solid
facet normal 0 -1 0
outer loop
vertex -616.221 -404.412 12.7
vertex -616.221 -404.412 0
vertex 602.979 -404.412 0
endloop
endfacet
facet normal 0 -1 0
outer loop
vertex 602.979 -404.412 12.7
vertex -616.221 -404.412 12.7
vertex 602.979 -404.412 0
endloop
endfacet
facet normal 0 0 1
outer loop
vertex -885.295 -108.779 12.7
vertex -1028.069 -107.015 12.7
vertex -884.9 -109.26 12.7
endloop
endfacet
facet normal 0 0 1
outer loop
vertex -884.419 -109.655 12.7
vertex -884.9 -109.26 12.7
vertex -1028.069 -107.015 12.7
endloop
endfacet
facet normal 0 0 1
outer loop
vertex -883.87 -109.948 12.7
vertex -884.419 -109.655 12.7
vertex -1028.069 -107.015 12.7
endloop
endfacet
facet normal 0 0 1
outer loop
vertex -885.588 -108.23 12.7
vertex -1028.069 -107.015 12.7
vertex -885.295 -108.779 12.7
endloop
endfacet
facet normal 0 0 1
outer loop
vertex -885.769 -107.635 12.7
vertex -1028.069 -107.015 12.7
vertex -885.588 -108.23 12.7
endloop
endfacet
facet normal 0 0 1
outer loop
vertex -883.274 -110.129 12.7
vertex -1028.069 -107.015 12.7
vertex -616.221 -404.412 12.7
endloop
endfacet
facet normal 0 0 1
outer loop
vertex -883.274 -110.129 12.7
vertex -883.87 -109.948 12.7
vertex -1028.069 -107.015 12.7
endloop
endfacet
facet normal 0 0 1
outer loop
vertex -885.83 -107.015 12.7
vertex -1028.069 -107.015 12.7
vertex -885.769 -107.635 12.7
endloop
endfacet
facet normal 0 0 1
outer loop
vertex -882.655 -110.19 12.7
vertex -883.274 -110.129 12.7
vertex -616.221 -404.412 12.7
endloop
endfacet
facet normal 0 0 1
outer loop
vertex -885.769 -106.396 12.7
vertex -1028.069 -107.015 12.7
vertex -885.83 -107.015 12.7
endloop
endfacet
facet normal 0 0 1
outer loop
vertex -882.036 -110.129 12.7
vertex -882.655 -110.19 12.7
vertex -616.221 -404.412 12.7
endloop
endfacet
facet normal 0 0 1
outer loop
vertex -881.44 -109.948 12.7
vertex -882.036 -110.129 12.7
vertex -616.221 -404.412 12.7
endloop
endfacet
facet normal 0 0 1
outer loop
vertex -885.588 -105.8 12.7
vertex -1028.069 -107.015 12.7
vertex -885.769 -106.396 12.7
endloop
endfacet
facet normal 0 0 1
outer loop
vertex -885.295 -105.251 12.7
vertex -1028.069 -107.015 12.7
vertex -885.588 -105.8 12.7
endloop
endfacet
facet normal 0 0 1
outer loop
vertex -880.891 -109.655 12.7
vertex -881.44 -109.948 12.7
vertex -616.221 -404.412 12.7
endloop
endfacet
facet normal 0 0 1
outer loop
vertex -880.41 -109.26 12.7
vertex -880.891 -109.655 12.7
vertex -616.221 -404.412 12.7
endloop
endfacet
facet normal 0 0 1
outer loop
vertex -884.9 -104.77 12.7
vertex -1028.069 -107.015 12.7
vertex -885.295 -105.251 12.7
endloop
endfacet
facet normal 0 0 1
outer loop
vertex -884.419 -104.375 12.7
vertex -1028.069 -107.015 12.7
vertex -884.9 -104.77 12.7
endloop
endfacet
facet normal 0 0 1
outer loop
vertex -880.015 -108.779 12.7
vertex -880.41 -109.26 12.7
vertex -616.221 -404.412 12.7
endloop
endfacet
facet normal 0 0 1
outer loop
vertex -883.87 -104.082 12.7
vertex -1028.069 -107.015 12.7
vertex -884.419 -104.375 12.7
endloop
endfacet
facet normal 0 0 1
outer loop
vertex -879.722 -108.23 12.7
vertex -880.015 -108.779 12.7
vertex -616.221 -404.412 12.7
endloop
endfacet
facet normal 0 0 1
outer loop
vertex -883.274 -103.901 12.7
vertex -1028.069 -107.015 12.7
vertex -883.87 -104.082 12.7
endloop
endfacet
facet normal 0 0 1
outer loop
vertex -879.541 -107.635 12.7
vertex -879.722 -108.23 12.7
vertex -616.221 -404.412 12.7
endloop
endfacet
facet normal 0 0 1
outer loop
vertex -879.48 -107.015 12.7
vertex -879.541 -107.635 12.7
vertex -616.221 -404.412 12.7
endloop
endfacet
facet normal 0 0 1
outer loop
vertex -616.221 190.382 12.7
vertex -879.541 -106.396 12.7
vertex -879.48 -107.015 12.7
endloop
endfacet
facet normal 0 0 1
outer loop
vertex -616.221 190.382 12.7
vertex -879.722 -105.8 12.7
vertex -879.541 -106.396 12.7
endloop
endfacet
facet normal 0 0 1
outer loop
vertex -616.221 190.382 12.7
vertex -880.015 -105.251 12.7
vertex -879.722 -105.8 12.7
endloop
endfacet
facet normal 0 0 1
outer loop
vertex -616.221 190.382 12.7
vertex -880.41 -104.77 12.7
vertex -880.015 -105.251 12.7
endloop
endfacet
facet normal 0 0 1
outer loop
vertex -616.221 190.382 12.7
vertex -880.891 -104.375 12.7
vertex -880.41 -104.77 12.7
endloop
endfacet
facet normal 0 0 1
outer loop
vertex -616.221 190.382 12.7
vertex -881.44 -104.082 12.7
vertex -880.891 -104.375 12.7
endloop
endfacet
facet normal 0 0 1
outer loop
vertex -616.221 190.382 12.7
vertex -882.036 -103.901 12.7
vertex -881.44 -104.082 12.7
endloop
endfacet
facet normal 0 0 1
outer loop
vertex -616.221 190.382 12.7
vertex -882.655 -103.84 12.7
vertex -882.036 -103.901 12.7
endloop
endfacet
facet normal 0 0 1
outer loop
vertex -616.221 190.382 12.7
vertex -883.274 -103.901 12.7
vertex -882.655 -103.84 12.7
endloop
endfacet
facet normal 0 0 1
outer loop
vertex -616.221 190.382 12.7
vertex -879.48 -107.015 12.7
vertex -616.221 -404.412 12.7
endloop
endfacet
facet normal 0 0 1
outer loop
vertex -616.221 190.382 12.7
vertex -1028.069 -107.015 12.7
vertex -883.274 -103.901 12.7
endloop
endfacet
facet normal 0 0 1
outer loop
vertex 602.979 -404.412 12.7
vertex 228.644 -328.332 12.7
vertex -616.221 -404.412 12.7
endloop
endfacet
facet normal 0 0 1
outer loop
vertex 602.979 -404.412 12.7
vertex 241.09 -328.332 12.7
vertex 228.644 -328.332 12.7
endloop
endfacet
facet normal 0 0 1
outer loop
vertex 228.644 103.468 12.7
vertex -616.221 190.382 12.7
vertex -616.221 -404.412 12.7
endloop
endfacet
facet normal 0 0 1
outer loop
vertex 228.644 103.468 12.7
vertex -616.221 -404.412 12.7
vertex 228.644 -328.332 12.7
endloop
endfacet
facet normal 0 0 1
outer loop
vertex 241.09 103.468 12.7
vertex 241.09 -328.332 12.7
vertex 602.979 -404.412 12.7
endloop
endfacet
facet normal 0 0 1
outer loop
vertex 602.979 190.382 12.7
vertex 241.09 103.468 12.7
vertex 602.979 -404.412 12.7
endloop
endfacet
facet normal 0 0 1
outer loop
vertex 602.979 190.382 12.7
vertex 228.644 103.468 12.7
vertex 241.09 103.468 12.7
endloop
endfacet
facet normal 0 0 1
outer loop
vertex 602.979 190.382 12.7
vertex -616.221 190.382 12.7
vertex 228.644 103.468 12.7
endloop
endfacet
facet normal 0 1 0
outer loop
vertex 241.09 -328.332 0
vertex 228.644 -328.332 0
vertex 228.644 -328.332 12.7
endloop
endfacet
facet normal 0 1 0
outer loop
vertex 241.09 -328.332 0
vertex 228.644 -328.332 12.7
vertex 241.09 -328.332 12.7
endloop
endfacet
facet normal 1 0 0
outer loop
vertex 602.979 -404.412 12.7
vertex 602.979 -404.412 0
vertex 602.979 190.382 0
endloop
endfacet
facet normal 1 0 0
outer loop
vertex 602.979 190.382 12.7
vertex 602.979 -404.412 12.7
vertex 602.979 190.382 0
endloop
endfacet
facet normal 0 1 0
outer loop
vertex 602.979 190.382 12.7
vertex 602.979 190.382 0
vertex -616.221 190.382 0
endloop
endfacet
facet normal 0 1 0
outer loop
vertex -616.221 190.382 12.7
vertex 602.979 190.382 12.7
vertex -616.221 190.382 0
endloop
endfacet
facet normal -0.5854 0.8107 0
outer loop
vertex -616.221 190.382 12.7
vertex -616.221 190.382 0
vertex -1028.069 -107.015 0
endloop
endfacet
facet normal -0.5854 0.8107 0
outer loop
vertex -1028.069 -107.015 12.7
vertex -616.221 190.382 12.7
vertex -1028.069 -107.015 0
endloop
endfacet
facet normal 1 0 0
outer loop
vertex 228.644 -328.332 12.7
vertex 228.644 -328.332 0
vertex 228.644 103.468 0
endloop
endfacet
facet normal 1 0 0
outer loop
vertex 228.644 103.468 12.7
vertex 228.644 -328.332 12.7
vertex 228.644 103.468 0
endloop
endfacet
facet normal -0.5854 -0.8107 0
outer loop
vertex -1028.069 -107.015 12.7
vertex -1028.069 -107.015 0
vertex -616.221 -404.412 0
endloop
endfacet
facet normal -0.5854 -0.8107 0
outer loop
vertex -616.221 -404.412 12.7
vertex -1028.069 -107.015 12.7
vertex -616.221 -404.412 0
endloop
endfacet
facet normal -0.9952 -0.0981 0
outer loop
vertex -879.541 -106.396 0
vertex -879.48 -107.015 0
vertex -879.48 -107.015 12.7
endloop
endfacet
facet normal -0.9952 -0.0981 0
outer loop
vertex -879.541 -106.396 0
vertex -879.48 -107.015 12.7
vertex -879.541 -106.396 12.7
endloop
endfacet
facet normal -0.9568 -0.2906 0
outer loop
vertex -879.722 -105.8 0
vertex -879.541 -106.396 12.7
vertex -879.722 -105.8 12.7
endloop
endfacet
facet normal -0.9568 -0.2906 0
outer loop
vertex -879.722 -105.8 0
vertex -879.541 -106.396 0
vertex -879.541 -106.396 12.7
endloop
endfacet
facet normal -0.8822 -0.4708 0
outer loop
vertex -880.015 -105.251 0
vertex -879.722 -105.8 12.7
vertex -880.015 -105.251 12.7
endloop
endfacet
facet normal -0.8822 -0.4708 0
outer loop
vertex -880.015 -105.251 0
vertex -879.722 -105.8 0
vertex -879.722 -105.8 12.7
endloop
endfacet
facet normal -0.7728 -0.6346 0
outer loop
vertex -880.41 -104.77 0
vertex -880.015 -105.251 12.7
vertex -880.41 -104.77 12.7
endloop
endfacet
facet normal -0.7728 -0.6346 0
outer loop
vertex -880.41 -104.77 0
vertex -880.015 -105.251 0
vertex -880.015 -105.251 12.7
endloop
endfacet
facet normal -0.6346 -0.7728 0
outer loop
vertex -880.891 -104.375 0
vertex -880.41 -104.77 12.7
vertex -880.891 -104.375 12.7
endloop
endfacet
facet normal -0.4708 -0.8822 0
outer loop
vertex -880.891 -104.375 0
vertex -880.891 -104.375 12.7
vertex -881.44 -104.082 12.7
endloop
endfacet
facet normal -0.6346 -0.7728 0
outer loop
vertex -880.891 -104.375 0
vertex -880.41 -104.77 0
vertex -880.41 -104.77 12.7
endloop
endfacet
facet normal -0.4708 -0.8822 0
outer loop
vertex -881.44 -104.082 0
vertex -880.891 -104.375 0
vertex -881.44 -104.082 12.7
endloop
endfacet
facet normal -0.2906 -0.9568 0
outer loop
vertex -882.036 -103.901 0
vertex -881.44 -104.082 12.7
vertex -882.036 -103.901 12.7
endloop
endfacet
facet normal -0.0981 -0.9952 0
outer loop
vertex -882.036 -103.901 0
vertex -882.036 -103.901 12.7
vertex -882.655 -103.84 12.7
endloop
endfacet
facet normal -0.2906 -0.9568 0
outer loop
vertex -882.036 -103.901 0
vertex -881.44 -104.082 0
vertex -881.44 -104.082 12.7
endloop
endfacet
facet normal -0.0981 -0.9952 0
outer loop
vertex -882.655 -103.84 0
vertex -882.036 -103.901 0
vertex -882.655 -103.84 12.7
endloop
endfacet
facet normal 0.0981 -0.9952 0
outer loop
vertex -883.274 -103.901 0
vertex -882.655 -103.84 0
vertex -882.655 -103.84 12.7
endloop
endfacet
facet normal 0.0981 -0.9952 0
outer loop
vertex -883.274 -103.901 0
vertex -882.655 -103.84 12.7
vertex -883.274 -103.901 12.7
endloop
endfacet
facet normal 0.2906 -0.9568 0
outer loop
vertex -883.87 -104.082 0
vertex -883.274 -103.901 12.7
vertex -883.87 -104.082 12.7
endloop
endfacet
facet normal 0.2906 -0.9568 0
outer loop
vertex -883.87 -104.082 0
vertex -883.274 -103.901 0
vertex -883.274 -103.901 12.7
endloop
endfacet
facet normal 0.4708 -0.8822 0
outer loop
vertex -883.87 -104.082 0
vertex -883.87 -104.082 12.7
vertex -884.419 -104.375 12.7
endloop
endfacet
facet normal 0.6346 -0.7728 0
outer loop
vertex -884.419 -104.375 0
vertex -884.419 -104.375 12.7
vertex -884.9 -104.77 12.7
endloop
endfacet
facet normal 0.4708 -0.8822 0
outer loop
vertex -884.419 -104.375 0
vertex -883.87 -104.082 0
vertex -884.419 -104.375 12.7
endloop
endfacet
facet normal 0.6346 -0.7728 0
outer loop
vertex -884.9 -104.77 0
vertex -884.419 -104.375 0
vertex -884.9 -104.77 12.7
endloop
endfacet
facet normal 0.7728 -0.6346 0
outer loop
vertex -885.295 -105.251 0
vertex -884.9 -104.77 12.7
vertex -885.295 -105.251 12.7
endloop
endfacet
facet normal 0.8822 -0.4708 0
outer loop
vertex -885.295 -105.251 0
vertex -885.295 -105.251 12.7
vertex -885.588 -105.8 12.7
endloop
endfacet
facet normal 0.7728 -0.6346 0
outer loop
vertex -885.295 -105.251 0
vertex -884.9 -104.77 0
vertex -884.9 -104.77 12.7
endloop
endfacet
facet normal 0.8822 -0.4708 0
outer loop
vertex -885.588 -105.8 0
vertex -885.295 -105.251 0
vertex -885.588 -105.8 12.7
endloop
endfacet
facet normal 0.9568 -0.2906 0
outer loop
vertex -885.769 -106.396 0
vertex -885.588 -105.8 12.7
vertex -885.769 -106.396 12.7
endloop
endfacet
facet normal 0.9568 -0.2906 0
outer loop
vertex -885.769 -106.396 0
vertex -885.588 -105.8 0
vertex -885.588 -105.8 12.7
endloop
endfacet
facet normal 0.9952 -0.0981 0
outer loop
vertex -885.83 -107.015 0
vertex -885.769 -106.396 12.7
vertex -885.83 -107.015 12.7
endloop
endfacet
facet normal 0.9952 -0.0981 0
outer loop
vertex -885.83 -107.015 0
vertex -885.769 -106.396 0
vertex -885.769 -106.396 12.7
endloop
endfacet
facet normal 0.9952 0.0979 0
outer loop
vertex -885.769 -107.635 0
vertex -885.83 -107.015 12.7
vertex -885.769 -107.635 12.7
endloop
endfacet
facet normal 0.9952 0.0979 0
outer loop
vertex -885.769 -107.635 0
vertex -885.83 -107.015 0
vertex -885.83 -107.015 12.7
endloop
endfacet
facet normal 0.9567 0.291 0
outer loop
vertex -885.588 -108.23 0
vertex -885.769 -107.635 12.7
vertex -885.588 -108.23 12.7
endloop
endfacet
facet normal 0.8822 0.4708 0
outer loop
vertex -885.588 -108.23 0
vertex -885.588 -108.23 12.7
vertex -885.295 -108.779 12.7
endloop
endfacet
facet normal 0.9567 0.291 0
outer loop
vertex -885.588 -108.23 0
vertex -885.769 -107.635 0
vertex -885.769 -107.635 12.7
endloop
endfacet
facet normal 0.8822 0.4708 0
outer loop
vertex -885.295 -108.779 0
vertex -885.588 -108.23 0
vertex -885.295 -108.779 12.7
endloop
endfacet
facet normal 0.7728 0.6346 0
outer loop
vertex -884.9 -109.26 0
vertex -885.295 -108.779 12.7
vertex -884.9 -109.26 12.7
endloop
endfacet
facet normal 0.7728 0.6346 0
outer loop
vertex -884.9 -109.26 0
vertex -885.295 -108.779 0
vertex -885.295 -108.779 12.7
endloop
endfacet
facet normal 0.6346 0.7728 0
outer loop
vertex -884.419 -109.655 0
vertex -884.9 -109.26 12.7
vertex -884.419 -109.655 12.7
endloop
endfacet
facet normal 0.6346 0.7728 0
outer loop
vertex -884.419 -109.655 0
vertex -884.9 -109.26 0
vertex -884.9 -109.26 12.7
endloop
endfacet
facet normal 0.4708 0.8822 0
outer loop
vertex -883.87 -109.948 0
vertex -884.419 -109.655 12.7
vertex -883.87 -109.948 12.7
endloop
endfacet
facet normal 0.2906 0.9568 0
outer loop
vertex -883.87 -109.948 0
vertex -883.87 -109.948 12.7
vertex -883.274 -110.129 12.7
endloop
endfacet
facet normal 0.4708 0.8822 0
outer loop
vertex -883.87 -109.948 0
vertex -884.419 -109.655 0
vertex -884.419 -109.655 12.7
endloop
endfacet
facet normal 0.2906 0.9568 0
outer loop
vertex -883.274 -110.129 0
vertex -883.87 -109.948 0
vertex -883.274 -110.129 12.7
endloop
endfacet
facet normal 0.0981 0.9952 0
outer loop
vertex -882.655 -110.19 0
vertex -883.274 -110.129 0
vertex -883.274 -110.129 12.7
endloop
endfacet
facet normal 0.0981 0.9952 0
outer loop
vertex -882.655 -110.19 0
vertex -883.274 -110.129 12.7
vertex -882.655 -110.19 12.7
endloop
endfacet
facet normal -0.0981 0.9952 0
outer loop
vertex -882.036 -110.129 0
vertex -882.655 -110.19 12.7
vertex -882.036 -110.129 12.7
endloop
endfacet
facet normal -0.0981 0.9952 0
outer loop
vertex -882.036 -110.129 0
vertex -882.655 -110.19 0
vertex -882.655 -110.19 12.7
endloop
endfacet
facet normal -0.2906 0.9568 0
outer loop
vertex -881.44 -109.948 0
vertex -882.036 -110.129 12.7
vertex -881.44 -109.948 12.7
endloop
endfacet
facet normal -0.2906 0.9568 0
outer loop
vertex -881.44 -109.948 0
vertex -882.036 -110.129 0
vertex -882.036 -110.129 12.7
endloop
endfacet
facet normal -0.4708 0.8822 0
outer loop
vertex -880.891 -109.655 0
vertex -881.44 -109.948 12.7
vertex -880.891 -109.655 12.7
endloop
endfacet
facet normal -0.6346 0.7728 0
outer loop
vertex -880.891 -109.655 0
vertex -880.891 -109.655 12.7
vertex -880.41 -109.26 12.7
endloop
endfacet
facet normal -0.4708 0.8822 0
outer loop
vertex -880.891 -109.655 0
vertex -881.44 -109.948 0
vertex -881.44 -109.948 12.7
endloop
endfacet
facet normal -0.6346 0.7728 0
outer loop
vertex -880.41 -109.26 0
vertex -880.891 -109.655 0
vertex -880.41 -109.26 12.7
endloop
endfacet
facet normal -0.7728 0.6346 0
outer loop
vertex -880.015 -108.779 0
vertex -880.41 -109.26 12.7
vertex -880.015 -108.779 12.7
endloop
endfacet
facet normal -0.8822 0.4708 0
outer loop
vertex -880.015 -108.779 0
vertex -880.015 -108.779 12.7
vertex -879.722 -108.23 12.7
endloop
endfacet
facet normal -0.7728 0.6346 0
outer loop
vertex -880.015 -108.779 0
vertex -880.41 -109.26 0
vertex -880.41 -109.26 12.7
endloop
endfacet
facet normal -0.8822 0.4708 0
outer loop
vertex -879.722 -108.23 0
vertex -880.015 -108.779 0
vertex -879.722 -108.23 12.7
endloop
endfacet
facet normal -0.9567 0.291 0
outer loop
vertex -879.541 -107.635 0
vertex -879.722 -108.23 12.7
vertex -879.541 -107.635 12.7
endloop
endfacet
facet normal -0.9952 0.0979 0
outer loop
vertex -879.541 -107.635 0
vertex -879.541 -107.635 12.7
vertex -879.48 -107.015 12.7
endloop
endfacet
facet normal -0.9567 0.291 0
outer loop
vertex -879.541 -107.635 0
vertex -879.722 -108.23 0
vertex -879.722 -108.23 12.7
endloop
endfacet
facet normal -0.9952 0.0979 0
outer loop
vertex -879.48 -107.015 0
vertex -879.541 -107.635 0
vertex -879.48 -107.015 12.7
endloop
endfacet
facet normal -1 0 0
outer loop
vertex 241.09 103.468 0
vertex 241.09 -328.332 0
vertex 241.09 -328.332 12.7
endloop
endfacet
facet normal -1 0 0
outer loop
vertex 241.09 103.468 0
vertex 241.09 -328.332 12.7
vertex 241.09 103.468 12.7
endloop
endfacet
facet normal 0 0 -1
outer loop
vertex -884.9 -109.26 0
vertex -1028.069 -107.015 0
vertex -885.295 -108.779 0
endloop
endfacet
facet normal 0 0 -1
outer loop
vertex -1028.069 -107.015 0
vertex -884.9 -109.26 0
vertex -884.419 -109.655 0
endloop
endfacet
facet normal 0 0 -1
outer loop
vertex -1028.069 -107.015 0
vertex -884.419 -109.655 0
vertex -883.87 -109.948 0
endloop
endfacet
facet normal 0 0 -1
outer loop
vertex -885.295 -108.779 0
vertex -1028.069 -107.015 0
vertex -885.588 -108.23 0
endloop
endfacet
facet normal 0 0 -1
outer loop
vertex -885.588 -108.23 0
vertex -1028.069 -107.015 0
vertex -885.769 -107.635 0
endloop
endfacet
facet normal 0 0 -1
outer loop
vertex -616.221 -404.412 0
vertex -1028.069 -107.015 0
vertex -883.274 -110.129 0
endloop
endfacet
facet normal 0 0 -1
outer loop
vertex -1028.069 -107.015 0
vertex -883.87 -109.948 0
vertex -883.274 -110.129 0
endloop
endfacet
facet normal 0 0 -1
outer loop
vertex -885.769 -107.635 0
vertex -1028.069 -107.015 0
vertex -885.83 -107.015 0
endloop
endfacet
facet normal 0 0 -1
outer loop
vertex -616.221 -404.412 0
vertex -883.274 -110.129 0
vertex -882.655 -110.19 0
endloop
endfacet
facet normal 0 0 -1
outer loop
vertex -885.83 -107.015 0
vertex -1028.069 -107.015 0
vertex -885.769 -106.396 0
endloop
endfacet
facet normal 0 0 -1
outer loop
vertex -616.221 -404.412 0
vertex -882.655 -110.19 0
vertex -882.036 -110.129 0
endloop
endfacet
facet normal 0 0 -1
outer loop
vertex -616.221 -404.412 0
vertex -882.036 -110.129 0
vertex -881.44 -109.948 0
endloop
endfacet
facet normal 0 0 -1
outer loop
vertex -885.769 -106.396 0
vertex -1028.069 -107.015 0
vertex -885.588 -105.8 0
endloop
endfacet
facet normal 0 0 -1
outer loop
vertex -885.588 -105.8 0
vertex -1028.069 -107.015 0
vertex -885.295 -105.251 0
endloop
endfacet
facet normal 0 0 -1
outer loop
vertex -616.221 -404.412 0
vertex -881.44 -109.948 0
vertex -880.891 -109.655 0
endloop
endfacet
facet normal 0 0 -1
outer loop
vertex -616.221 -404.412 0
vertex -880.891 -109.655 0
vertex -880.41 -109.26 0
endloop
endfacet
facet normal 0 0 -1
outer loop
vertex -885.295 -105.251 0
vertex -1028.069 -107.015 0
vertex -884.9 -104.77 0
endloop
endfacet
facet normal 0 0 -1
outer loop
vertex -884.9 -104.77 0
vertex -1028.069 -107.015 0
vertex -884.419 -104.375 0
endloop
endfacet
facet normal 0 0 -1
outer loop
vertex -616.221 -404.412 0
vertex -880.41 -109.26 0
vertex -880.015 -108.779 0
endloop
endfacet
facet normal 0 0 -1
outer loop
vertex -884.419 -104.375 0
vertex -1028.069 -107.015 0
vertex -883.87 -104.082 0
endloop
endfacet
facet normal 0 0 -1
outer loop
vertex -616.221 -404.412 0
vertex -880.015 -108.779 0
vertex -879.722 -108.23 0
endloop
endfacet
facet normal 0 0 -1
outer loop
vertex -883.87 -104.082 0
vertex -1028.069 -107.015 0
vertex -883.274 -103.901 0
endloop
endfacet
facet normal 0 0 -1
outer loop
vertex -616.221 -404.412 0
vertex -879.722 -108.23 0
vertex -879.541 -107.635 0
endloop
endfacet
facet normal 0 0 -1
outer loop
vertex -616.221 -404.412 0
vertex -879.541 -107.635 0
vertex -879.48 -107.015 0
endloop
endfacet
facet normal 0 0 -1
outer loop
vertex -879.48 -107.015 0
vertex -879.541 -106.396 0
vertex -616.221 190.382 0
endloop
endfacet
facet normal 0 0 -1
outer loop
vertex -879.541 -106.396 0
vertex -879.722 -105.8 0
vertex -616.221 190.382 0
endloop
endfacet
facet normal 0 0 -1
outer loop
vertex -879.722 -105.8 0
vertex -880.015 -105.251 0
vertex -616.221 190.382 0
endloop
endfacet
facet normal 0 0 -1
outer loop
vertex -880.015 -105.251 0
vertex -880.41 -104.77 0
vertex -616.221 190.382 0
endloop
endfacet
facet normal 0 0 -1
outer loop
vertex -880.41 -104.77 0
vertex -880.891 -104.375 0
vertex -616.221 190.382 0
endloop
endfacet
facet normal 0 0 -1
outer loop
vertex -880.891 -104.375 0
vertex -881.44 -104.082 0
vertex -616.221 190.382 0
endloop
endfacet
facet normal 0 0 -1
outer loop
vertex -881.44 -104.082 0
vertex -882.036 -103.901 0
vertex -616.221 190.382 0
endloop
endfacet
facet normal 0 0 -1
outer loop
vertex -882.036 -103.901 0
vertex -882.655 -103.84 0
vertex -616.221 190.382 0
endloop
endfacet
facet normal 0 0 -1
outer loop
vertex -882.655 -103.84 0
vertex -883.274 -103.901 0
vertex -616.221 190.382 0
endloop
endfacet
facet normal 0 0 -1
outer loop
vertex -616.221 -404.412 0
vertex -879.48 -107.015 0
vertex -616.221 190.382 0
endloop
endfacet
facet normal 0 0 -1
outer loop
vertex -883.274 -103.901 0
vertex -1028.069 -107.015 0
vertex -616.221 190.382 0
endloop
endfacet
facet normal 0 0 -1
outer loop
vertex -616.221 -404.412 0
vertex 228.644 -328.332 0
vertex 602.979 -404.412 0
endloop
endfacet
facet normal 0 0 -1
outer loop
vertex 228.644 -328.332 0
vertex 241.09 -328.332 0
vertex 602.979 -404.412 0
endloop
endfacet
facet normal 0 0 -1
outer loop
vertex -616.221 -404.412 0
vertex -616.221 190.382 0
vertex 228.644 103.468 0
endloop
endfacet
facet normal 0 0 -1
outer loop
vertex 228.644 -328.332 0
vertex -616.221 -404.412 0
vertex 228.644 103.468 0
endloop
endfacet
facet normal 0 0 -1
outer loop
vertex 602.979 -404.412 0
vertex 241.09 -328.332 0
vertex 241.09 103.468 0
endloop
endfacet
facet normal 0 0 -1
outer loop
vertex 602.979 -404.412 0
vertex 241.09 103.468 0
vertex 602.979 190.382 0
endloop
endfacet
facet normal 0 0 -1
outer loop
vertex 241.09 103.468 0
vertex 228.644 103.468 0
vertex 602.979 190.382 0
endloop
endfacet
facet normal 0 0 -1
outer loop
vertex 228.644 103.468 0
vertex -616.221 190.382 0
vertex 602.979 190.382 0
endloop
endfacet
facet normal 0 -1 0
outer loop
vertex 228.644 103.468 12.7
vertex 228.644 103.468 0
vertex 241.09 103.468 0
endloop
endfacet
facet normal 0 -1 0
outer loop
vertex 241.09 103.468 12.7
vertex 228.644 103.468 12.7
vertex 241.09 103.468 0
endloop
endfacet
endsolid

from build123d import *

# Parameters (mm, degrees)
F0_W     = 12.446
F0_H     = 431.8
F0_R     = 3.175
F1_DEPTH = 12.7


with BuildPart() as f1:
    # F0 (on Top) → F1 (new body)
    with BuildSketch(Plane.XY):
        Polygon((602.978926, 190.381889), (-616.221074, 190.381889), (-1028.069377, -107.015111), (-616.221074, -404.412111), (602.978926, -404.412111), align=None)
        with Locations((234.867118, -112.431925)):
            Rectangle(F0_W, F0_H, mode=Mode.SUBTRACT)
        with Locations((-882.655084, -107.015111)):
            Circle(F0_R, mode=Mode.SUBTRACT)
    extrude(amount=F1_DEPTH)


solid = f1.part
